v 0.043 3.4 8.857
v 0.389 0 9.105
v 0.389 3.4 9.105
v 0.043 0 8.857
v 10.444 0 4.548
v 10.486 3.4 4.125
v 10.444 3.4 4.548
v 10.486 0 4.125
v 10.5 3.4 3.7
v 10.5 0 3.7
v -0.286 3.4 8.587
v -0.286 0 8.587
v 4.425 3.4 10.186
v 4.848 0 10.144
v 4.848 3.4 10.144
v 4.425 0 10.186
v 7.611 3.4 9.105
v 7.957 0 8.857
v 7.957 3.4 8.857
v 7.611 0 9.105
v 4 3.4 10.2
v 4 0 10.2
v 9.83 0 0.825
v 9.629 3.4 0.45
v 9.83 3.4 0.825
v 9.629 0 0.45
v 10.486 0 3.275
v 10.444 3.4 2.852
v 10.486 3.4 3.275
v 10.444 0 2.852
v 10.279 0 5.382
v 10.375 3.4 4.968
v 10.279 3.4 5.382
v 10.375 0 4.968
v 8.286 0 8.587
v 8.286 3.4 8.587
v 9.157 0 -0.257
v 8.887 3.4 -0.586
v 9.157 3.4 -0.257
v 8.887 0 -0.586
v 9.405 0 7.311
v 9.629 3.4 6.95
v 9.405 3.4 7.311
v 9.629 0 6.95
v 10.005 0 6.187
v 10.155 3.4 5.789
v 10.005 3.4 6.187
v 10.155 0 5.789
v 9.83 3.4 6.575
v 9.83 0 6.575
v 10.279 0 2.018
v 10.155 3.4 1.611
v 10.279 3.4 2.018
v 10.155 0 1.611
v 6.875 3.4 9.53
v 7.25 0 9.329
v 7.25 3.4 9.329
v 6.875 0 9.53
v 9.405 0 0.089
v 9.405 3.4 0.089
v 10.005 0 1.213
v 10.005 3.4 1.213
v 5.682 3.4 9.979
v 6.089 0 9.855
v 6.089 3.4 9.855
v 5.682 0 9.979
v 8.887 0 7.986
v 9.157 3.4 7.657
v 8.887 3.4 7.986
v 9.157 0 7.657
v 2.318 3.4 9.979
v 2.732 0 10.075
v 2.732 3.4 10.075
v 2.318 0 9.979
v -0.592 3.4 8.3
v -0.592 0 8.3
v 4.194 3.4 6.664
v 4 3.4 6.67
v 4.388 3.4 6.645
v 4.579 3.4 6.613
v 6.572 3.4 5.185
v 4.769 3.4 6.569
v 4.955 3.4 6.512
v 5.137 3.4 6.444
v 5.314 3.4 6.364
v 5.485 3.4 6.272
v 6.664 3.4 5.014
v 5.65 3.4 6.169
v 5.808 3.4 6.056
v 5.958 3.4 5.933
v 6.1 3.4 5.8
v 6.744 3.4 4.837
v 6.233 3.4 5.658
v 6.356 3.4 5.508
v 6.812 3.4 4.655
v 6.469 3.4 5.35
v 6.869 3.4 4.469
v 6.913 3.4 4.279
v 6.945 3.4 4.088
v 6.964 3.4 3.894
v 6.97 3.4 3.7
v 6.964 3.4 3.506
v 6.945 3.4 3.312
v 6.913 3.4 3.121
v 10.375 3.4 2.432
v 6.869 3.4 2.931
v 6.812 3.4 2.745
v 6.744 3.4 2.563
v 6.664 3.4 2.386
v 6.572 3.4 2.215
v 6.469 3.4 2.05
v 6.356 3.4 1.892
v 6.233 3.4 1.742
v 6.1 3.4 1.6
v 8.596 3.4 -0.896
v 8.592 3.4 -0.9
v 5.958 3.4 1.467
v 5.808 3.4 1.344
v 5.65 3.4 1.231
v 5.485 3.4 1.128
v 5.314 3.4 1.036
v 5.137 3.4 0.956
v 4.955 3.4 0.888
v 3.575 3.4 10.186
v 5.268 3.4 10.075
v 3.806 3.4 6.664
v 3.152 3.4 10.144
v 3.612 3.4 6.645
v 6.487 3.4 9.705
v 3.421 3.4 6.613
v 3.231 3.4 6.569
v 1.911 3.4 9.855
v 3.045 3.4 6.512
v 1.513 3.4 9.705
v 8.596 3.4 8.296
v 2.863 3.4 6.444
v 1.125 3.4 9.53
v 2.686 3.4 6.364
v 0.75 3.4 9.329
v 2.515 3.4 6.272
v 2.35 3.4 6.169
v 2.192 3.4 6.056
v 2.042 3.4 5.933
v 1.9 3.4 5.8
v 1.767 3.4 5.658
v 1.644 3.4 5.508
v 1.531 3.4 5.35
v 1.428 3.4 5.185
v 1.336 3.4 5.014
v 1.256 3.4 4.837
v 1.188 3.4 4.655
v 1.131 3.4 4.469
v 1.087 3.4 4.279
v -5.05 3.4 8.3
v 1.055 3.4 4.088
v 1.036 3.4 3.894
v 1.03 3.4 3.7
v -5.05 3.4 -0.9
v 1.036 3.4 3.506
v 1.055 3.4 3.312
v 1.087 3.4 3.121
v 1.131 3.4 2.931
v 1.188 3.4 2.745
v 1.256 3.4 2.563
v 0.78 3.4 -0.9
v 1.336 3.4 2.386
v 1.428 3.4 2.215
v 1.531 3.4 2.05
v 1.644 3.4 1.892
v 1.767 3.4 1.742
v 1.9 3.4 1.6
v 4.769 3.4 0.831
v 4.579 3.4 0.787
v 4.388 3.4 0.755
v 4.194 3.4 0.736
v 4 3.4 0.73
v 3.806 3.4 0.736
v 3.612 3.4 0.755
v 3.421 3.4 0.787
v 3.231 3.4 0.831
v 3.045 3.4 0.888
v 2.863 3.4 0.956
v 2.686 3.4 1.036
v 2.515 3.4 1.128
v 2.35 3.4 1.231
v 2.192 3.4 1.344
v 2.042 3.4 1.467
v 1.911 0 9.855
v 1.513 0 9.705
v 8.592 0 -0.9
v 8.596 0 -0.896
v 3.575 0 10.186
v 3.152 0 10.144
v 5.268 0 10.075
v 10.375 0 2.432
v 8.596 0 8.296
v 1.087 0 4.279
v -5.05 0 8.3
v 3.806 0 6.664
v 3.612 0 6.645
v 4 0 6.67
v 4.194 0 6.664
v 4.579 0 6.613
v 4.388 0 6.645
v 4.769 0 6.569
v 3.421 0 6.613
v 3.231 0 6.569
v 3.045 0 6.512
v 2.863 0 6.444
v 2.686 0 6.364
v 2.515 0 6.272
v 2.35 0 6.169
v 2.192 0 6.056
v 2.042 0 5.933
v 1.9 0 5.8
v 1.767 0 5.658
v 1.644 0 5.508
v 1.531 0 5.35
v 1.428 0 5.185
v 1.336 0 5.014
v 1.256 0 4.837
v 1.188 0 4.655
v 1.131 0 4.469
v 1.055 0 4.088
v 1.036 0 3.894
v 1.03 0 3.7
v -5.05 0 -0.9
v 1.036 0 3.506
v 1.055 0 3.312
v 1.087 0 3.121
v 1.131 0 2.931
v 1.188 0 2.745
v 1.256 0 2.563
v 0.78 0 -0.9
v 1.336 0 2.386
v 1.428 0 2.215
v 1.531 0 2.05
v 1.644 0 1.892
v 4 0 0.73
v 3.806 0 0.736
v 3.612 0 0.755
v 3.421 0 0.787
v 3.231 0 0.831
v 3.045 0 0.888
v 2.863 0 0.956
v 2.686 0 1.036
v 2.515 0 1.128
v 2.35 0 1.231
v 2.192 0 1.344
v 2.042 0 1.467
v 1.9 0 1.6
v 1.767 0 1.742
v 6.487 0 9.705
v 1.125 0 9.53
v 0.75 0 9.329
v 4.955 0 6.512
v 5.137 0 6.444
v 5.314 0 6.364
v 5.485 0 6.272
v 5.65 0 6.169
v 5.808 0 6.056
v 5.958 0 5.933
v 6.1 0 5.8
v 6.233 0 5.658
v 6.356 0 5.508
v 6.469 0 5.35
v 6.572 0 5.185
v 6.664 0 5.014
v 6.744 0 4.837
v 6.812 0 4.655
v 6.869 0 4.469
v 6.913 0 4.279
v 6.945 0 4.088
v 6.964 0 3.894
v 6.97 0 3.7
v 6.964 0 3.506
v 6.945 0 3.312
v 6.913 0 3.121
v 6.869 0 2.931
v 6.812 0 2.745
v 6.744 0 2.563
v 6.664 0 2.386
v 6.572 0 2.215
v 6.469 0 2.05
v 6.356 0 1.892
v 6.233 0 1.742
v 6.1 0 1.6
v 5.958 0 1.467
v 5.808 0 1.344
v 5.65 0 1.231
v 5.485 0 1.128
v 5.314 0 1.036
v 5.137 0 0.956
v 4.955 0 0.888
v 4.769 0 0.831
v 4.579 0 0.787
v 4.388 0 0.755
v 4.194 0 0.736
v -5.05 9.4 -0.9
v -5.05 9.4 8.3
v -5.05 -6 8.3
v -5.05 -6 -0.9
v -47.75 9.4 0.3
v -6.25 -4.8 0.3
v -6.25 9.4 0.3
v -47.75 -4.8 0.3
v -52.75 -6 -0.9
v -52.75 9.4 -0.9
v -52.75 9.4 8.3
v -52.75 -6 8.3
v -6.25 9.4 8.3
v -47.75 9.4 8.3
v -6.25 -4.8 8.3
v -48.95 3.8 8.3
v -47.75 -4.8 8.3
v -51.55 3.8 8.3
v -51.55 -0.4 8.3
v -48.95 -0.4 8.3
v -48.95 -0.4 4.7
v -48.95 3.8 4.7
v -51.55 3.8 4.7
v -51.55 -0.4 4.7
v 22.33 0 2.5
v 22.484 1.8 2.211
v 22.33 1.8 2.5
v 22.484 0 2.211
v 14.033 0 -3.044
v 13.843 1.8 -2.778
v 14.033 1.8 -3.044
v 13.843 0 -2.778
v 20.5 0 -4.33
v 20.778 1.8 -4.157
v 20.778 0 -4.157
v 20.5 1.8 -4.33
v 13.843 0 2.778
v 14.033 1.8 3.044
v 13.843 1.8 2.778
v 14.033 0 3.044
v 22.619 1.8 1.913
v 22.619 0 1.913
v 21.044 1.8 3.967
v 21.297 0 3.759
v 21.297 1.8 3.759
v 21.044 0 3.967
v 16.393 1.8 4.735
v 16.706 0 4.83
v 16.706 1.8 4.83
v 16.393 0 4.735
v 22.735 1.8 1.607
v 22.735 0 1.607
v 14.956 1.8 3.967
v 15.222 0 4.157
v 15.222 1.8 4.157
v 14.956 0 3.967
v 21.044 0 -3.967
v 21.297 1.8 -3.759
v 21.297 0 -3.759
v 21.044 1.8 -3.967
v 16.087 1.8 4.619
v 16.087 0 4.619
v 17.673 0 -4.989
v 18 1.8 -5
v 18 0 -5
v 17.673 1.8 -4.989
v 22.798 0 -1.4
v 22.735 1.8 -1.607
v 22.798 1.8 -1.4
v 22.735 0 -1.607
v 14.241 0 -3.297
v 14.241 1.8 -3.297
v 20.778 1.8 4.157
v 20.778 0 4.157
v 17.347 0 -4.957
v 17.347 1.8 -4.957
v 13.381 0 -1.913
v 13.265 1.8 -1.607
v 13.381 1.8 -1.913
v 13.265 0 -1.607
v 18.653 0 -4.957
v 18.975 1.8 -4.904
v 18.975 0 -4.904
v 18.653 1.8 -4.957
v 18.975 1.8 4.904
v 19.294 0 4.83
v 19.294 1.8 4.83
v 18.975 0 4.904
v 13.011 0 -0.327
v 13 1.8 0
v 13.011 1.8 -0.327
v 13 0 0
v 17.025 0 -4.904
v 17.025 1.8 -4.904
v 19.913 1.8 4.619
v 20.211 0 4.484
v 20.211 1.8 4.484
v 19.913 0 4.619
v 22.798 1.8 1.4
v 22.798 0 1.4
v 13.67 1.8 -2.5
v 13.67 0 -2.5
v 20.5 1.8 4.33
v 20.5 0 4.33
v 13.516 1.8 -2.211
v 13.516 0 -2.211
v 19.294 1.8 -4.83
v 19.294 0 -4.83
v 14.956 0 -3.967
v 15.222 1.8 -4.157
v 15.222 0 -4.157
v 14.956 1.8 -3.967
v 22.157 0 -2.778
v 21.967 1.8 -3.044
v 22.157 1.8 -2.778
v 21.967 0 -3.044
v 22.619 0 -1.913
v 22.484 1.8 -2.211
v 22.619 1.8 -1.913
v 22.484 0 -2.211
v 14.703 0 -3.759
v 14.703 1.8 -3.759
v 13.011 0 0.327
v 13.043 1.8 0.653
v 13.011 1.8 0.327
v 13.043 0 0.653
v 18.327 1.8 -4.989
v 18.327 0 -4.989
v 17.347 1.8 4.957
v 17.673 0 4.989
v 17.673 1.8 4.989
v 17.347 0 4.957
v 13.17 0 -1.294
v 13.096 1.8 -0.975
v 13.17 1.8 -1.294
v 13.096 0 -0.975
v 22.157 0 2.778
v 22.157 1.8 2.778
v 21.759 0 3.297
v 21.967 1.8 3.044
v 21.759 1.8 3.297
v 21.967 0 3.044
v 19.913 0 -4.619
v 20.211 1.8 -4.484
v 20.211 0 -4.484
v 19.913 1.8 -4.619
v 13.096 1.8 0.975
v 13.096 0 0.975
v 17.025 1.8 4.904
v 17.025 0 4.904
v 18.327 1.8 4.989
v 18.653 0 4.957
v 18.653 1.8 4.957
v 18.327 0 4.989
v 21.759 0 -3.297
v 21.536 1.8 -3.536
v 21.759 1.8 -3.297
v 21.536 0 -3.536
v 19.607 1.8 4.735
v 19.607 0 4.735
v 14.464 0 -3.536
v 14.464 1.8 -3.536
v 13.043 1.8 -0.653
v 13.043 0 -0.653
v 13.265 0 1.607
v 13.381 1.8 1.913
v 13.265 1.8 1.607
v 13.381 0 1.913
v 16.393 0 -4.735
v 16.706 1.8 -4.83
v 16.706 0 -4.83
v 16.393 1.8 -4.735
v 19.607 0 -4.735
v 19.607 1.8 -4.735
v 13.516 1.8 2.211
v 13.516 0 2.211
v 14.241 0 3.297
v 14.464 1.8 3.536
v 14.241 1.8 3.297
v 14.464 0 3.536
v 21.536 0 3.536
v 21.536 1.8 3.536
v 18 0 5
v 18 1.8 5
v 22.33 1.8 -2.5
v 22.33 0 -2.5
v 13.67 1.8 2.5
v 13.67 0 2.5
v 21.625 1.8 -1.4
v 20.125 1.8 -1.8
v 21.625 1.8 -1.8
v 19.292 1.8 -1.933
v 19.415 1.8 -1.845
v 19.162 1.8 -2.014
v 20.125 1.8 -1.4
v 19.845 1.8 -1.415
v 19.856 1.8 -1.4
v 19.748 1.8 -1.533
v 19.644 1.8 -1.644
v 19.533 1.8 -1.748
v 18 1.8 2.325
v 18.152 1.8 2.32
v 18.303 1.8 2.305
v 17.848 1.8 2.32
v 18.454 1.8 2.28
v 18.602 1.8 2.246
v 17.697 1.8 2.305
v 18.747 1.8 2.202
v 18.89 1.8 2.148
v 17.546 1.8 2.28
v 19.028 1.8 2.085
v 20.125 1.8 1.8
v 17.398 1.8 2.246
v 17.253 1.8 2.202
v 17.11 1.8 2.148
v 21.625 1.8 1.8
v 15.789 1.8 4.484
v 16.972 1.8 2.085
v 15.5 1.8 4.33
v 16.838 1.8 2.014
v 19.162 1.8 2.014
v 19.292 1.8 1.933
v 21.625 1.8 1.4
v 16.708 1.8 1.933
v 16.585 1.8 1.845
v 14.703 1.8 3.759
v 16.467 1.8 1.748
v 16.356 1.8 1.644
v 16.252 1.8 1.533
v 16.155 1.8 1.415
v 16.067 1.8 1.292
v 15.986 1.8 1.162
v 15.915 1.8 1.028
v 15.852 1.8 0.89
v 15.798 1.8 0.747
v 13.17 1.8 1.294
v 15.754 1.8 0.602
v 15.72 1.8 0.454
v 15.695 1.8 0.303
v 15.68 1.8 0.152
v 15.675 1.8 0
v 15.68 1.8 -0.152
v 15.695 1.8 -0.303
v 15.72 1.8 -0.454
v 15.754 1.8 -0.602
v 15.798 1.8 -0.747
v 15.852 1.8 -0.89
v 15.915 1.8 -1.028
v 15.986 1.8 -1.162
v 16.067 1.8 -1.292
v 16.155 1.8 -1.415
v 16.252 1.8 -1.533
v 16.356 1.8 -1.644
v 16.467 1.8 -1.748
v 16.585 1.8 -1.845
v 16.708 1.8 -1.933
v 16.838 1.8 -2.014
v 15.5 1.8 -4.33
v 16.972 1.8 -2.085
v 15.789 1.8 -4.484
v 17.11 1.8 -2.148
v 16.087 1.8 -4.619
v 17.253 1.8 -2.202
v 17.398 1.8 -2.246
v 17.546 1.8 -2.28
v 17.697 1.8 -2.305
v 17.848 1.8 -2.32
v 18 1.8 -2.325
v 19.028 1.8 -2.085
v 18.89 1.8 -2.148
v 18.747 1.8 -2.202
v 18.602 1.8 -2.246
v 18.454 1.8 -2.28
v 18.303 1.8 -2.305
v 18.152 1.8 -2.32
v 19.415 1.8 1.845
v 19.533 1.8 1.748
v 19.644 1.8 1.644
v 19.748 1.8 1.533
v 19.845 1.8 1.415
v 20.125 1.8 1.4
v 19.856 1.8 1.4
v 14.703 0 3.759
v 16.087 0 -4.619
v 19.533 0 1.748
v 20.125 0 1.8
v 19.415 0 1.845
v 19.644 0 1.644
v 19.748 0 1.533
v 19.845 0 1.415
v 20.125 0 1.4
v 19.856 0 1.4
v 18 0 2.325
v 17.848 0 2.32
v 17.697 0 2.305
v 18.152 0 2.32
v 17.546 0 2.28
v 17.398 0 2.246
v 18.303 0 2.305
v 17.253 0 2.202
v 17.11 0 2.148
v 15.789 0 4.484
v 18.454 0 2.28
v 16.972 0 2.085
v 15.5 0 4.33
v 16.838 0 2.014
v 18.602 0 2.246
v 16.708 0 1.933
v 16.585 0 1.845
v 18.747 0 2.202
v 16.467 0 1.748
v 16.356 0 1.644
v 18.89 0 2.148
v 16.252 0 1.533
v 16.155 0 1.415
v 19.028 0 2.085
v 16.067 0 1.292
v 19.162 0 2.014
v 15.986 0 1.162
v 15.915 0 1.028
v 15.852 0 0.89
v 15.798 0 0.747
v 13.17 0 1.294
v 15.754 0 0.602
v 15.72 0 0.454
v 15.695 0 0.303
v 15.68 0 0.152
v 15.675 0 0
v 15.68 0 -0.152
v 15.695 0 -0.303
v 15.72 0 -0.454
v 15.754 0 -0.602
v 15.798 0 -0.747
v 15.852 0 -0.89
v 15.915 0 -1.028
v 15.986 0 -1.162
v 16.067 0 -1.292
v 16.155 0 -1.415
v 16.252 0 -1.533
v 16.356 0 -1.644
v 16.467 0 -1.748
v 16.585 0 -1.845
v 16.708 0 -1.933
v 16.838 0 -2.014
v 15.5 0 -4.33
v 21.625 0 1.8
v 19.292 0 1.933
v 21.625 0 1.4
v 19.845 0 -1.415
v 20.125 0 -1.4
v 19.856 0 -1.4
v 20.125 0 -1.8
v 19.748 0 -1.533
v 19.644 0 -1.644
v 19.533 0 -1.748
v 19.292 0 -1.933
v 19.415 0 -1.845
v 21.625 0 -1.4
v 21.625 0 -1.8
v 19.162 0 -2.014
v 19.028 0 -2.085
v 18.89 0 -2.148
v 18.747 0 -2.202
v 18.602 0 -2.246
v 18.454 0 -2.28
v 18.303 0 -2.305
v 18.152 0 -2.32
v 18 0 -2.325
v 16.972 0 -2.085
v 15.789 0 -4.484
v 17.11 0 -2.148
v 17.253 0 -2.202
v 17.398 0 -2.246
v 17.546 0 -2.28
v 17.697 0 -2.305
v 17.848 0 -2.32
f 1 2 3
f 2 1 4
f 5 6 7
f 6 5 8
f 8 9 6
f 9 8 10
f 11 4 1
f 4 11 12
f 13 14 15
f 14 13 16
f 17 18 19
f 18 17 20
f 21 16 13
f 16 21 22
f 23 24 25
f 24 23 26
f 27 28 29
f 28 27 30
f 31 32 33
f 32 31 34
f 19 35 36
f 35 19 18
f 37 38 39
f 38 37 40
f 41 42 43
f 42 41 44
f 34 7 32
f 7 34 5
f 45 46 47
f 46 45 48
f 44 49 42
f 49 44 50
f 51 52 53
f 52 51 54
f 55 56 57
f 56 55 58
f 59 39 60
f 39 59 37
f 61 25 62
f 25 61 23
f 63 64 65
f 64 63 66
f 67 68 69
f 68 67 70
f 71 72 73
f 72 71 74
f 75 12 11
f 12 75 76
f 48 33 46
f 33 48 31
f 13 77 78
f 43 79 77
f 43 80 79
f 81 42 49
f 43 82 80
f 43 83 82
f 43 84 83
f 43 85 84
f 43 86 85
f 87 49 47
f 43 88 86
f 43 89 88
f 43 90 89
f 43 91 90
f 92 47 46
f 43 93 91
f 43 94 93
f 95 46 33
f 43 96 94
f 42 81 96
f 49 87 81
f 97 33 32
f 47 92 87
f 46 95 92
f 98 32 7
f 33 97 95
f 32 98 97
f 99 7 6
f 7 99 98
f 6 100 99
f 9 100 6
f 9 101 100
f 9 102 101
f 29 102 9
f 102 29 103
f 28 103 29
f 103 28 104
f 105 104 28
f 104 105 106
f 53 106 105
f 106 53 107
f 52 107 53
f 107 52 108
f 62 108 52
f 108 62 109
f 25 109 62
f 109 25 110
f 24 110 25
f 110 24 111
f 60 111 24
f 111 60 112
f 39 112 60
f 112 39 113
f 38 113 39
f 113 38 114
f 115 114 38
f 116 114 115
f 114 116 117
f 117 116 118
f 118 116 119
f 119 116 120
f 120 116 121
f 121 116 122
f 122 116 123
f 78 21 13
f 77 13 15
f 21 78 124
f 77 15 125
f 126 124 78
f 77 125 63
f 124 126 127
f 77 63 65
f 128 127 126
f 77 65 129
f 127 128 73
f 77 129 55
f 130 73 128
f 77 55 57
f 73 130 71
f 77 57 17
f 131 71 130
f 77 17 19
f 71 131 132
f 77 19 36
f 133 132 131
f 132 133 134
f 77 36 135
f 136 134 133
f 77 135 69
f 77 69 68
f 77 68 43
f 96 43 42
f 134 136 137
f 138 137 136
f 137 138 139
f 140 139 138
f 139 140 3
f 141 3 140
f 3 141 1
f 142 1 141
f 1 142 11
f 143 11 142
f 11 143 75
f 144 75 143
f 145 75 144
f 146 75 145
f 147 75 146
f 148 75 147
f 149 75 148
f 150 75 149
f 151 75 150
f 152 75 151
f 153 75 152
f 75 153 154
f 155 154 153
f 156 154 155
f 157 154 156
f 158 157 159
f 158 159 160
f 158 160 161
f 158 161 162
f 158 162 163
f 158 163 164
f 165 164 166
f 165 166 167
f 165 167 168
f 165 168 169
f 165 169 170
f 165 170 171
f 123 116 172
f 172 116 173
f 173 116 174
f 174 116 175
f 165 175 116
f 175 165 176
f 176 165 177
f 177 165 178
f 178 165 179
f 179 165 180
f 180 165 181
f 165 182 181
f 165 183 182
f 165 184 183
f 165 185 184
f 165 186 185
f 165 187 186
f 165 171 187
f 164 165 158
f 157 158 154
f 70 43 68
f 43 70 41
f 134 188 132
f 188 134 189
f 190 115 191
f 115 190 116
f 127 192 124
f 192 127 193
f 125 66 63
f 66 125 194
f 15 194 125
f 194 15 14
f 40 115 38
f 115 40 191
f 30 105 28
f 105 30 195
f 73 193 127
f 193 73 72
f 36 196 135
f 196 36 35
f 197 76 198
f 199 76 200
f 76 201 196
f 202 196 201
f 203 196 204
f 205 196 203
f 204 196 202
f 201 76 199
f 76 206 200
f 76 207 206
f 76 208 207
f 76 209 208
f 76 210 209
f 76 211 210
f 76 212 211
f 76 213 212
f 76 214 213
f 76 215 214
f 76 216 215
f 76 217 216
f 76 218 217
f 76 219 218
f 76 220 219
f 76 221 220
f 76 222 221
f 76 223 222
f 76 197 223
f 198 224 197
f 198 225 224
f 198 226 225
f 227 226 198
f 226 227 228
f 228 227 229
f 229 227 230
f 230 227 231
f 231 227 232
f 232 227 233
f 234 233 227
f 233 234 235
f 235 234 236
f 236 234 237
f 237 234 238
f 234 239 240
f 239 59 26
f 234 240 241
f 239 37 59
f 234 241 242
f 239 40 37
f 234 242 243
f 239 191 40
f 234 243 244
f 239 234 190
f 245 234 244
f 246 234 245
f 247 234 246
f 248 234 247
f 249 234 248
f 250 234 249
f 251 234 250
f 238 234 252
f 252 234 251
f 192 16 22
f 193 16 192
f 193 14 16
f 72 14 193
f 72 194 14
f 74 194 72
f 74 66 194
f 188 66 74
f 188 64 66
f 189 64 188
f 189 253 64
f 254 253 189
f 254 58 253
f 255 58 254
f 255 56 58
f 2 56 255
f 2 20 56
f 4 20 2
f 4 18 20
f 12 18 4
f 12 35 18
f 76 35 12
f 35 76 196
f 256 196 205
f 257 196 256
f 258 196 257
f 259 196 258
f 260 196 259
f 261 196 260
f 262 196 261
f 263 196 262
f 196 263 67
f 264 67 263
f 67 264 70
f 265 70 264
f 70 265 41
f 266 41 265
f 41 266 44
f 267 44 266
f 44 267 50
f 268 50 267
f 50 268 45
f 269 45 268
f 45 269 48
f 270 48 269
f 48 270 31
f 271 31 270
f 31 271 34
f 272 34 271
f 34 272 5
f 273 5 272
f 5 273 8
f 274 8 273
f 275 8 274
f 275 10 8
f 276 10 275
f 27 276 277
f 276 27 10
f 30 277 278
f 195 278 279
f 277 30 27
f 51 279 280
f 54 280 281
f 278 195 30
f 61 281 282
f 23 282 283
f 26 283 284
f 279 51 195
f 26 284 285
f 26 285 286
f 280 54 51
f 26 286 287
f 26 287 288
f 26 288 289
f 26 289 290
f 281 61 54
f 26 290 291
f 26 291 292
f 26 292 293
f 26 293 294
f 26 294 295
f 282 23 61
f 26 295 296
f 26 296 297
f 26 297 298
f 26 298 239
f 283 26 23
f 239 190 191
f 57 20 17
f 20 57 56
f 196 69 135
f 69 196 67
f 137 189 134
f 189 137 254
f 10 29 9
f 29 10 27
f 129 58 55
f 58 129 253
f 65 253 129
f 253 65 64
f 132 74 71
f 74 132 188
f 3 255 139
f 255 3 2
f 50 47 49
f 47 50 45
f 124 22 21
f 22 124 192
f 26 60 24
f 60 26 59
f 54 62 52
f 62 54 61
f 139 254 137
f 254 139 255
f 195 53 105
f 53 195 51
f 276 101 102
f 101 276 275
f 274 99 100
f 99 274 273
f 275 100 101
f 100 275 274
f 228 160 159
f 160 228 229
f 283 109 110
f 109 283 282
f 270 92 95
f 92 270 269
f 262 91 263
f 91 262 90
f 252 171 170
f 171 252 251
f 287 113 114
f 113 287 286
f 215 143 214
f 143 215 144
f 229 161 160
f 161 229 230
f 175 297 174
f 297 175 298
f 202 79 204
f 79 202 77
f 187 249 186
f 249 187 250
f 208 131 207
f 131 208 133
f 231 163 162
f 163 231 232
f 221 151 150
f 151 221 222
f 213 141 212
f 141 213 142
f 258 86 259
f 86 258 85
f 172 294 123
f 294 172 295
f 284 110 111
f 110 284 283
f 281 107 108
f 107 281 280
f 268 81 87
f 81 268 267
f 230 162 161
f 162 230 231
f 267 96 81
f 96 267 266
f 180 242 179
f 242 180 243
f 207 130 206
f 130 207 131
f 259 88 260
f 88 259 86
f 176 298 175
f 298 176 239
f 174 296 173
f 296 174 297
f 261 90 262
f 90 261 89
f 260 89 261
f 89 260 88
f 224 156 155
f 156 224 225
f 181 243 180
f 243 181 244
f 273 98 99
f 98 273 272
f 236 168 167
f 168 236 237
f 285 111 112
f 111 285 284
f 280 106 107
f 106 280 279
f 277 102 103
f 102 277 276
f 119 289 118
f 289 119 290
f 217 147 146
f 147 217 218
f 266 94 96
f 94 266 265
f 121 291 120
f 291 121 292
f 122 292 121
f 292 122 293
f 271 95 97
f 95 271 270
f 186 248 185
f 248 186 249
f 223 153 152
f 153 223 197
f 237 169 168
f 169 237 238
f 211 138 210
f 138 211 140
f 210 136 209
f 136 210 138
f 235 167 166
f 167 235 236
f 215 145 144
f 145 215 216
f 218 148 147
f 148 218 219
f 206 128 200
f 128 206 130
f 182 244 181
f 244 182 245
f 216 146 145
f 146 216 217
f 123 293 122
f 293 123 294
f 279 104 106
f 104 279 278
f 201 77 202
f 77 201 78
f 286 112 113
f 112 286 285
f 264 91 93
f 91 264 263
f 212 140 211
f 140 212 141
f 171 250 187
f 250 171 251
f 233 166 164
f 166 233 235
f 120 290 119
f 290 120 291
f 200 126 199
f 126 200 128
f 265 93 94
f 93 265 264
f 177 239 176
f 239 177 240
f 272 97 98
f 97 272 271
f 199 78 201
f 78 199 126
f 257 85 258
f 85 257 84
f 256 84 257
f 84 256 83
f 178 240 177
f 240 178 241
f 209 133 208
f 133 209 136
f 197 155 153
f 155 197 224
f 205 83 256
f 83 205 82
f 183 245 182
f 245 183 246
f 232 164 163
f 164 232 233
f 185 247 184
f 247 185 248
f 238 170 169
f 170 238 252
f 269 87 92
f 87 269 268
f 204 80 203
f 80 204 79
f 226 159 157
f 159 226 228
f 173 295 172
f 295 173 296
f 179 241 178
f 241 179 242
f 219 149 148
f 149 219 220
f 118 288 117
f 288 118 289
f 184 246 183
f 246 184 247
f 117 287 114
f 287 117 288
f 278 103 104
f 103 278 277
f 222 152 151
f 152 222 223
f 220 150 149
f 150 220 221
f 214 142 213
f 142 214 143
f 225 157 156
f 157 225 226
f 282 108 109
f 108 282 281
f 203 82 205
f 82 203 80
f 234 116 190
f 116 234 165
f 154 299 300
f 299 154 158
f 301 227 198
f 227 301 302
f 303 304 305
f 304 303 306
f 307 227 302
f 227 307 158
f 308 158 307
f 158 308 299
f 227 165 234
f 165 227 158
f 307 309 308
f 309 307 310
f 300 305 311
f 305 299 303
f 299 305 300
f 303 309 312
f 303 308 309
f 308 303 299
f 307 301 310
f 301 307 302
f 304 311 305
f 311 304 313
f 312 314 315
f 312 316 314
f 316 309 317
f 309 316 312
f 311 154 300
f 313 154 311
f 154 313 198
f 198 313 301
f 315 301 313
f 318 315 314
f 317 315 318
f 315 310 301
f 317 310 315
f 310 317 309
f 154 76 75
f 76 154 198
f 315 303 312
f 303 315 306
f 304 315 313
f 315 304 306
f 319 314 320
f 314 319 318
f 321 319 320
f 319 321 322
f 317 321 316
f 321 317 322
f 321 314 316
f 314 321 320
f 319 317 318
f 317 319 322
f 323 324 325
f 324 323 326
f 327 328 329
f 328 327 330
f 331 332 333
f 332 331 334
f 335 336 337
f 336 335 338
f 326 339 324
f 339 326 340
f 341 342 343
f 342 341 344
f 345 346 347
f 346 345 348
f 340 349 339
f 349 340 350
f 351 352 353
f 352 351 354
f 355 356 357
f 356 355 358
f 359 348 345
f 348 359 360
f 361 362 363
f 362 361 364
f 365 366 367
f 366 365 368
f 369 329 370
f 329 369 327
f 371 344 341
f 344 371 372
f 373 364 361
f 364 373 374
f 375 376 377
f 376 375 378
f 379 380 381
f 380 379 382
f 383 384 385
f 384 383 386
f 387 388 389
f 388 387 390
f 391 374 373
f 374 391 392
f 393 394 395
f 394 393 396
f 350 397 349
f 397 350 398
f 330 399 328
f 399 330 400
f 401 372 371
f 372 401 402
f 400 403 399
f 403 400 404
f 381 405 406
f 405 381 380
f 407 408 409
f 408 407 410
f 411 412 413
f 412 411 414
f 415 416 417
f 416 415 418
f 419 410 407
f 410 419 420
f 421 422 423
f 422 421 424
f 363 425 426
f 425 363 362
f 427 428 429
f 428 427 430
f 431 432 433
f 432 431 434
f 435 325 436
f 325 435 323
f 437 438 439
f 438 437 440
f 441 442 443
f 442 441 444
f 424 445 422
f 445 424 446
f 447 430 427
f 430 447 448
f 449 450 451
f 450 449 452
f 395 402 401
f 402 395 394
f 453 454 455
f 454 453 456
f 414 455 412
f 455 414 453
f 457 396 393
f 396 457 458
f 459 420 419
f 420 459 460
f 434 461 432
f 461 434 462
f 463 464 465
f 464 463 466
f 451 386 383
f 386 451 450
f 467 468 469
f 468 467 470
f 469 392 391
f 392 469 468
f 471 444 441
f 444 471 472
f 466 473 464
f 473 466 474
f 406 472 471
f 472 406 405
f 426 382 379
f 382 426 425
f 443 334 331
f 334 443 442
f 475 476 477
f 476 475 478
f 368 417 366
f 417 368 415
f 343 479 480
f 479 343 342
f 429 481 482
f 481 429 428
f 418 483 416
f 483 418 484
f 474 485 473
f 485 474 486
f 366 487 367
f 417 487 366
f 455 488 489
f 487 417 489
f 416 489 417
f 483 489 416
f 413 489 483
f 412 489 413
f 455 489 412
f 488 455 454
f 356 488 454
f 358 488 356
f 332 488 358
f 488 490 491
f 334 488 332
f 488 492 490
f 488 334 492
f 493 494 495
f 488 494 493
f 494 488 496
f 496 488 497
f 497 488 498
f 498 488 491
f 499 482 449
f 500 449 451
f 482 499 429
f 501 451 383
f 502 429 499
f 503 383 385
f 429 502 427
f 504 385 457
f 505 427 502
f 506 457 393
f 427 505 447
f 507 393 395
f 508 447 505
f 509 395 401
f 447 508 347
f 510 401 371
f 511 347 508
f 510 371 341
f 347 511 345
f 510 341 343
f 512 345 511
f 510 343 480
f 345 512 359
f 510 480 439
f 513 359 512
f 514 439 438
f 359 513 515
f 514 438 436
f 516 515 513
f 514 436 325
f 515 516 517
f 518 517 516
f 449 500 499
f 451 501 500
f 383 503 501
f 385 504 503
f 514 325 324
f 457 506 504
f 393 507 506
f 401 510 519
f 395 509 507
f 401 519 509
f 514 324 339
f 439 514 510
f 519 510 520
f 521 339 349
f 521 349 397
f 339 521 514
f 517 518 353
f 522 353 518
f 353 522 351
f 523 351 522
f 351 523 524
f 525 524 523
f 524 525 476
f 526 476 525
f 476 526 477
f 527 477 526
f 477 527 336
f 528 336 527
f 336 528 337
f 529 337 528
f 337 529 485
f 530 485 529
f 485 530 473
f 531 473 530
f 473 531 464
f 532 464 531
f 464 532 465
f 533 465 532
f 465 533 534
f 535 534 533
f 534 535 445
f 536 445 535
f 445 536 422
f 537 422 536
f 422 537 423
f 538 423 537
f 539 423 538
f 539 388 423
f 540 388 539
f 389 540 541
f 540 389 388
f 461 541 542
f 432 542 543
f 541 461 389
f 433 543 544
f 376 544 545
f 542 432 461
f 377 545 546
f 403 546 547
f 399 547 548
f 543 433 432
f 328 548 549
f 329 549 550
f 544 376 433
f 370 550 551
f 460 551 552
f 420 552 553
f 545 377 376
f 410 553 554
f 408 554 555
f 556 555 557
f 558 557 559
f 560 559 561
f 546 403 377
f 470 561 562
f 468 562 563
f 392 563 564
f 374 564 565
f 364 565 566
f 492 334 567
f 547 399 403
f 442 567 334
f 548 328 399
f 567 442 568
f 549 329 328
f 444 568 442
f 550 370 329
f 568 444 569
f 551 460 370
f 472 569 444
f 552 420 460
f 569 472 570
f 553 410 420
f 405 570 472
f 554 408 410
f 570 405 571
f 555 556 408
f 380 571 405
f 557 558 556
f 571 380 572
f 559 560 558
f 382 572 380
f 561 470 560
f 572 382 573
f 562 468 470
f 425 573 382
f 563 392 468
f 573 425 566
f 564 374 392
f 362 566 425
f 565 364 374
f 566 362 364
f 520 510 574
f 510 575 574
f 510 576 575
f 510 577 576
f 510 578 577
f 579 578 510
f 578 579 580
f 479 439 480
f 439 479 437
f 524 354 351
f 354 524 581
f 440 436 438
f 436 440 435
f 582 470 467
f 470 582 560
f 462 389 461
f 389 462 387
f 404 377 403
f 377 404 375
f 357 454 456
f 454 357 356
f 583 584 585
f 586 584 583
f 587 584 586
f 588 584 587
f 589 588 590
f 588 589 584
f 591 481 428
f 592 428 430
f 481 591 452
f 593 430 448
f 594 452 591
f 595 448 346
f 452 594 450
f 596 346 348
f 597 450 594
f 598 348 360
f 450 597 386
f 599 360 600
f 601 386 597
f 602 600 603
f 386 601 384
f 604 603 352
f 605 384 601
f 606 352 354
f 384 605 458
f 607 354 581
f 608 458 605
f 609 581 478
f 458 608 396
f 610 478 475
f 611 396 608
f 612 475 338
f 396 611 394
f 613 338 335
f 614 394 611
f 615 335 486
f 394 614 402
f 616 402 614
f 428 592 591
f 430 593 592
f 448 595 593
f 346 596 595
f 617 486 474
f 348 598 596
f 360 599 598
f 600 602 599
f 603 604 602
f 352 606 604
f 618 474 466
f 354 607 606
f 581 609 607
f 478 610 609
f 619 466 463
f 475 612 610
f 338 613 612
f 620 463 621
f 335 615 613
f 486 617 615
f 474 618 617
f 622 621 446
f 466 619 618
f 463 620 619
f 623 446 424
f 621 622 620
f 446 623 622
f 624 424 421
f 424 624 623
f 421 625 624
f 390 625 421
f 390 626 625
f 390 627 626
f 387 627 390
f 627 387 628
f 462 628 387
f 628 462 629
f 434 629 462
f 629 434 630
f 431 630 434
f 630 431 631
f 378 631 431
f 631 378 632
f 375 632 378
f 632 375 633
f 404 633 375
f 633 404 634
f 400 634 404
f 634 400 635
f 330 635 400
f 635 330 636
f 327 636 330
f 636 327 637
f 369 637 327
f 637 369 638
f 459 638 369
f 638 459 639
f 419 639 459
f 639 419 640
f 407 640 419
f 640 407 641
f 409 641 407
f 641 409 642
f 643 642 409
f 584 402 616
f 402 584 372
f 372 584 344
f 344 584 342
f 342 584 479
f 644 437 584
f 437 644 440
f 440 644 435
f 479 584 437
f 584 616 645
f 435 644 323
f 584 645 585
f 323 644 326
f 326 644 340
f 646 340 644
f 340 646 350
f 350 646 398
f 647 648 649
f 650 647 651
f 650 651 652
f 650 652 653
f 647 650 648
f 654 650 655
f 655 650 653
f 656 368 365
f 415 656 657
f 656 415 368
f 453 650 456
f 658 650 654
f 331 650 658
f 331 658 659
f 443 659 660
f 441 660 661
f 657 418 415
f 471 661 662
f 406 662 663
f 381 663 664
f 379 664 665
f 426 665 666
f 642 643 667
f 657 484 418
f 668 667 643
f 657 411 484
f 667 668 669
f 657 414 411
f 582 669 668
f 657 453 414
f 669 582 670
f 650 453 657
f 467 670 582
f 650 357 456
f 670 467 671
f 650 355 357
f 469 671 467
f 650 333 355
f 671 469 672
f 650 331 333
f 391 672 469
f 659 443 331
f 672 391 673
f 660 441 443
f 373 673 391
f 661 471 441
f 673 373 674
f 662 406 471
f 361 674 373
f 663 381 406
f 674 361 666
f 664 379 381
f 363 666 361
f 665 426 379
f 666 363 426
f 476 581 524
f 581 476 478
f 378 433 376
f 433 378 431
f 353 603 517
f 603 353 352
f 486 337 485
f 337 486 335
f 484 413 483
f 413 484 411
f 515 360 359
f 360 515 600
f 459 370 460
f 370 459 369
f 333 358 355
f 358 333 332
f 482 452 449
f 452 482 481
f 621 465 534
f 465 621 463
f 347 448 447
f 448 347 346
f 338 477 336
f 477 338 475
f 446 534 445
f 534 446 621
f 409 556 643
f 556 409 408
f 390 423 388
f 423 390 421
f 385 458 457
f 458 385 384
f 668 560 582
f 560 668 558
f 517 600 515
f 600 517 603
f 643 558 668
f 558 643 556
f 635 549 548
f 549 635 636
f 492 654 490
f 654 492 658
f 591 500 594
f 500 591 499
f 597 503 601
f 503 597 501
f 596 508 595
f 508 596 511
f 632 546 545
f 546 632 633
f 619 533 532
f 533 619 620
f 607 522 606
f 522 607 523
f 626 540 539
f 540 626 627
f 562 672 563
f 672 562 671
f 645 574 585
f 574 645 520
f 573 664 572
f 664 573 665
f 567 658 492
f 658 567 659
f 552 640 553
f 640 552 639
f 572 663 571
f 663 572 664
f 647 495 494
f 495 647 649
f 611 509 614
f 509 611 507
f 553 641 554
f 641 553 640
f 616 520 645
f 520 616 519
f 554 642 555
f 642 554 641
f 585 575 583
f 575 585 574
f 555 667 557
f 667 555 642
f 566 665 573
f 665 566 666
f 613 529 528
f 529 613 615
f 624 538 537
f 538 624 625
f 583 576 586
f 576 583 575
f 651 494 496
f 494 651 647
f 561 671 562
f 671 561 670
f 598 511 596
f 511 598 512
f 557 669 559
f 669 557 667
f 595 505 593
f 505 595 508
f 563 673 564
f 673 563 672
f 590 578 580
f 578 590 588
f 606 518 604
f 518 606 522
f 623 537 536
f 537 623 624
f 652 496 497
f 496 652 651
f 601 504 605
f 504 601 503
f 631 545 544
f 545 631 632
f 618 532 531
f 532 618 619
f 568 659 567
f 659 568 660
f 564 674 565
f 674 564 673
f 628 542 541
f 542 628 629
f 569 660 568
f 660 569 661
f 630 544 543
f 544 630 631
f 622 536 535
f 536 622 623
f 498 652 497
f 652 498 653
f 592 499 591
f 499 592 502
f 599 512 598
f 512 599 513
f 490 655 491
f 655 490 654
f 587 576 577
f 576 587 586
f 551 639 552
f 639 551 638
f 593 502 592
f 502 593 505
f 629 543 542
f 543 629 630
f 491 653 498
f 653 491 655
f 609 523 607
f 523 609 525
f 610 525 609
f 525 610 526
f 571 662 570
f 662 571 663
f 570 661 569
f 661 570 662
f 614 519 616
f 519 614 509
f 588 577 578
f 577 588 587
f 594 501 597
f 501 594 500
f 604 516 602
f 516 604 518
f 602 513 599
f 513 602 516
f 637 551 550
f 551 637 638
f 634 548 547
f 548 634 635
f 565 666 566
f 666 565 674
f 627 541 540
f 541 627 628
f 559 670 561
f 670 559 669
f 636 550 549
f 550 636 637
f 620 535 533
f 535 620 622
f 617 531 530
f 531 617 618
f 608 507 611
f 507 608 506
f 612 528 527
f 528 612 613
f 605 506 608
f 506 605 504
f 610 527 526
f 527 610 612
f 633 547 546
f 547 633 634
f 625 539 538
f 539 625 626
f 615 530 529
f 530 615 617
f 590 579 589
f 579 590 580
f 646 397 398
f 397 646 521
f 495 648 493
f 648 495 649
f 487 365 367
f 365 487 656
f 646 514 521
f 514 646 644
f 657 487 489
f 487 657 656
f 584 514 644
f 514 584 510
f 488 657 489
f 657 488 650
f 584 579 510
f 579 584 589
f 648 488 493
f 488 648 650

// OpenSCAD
// DOUBLE TAKE FRAMES DESIGN RELEASE
// DTF_RELEASE: 2.0.2
// Released: 2026-09-04
// Versioning: Semantic Versioning 2.0.0 (https://semver.org/)
// Status: CANONICAL
// Changes in 2.0.2:
// - Carried forward unchanged for the native 3MF packaging hotfix.
// Changes in 2.0.1:
// - Carried forward unchanged for the prepared-project packaging correction.
// Changes in 2.0.0:
// - Carried forward without geometry changes for the coordinated 2.0.0 release.
// Full release notes: https://doubletakeframes.com/build/#design-release
//
$fn = 96;

eps = 0.05;

// 0 = separated printable latch and keeper
// 1 = FN-weight latch only
// 2 = C-shaped keeper only
render_part = 0;

// =========================================================
// FN WEIGHT LATCH
// =========================================================
post_d = 5.5;
clear_radial = 0.22;
eye_inner_d = post_d + 2 * clear_radial;
eye_outer_d = 13.0;

latch_t = 3.4;
pivot_x = 4.0;

corral_clear_w_x = 41.5;
corral_clear_d_y = 13.0;
corral_wall_t = 1.2;
corral_depth_z = 8.0;
corral_floor_t = 1.2;
corral_end_wall_t_x = 5.0;
canonical_weight_center_x = -27.0;

// Match the installed latch plane used by the canonical dry-wall rig.
standoff_h = 0.8;
post_h = 4.0;
corral_global_outer_y1 = -0.30;
corral_center_y_target = corral_global_outer_y1
                         - (corral_clear_d_y + 2 * corral_wall_t) / 2;
pad_t = -corral_center_y_target - standoff_h - post_h / 2;
post_y1 = -pad_t - standoff_h - post_h;
latch_install_y = post_y1 + (post_h - latch_t) / 2;

corral_inner_x0 = canonical_weight_center_x - corral_clear_w_x / 2;
corral_inner_x1 = canonical_weight_center_x + corral_clear_w_x / 2;
corral_floor_x0 = corral_inner_x0 - corral_end_wall_t_x;
corral_floor_x1 = corral_inner_x1 + corral_wall_t;

corral_outer_y1 = corral_global_outer_y1 - latch_install_y;
corral_inner_y1 = corral_outer_y1 - corral_wall_t;
corral_inner_y0 = corral_inner_y1 - corral_clear_d_y;
corral_outer_y0 = corral_inner_y0 - corral_wall_t;

corral_floor_z0 = -0.90;
corral_floor_z = corral_floor_z0 + corral_floor_t;
corral_wall_z1 = corral_floor_z + corral_depth_z;
pivot_z = (corral_floor_z0 + corral_wall_z1) / 2;
pivot_eye_flat_local_z = corral_floor_z0 - pivot_z;

pivot_transition_x0 = corral_floor_x1;
pivot_transition_x1 = pivot_x - (eye_inner_d / 2 + 0.25);

// Far-end Y-retention socket. The matching roof-hung tooth belongs to the
// fixed dry-wall rig; this socket is open at the top so the latch disengages
// cleanly as it swings downward.
latch_key_tooth_w_x = 1.4;
latch_key_tooth_w_y = 3.0;
latch_key_clear_xy = 0.60;
latch_key_clear_z = 0.60;
latch_key_engagement_z = 3.0;

latch_key_xc = (corral_floor_x0 + corral_inner_x0) / 2;
latch_key_local_yc = (corral_outer_y0 + corral_outer_y1) / 2;
latch_key_notch_x0 = latch_key_xc - latch_key_tooth_w_x / 2
                     - latch_key_clear_xy;
latch_key_notch_x1 = latch_key_xc + latch_key_tooth_w_x / 2
                     + latch_key_clear_xy;
latch_key_notch_y0 = latch_key_local_yc - latch_key_tooth_w_y / 2
                     - latch_key_clear_xy;
latch_key_notch_y1 = latch_key_local_yc + latch_key_tooth_w_y / 2
                     + latch_key_clear_xy;
latch_key_notch_z0 = corral_wall_z1 - latch_key_engagement_z
                     - latch_key_clear_z;

// =========================================================
// C-SHAPED KEEPER
// =========================================================
clip_outer_d = 10.0;
clip_t = 1.8;
grip_hole_d = 4.65;
gap_w = 2.8;
flat_depth = 1.5;

// =========================================================
// HELPERS
// =========================================================
module rect_prism(x0, x1, y0, y1, z0, z1) {
    translate([min(x0, x1), min(y0, y1), min(z0, z1)])
        cube([abs(x1 - x0), abs(y1 - y0), abs(z1 - z0)]);
}

module cyl_y_span(d, y0, y1) {
    translate([0, max(y0, y1), 0])
        rotate([90, 0, 0])
            cylinder(d=d, h=abs(y1 - y0), center=false);
}

// =========================================================
// PRINTABLE PARTS
// =========================================================
module canonical_latch_core() {
    translate([pivot_x, 0, pivot_z])
        difference() {
            cyl_y_span(eye_outer_d, 0, latch_t);
            cyl_y_span(eye_inner_d, -0.1, latch_t + 0.2);

            // Flatten only the unused lower eye arc so the complete latch
            // prints on the same plane as the corral floor.
            rect_prism(-eye_outer_d / 2 - 1,
                       eye_outer_d / 2 + 1,
                       -0.1, latch_t + 0.2,
                       -eye_outer_d / 2 - 1,
                       pivot_eye_flat_local_z);
        }
}

module fn_weight_corral() {
    difference() {
        union() {
            // Shallow floor beneath the weight pocket and keyed extension.
            rect_prism(corral_floor_x0, corral_floor_x1,
                       corral_outer_y0, corral_outer_y1,
                       corral_floor_z0, corral_floor_z);

            // Viewer-facing wall. The frame wall closes the opposite side.
            rect_prism(corral_inner_x0, corral_inner_x1,
                       corral_outer_y0, corral_inner_y0,
                       corral_floor_z, corral_wall_z1);

            // Pivot-side wall.
            rect_prism(corral_inner_x1, corral_floor_x1,
                       corral_outer_y0, corral_outer_y1,
                       corral_floor_z, corral_wall_z1);

            // Substantial far-end wall carrying the retention socket.
            rect_prism(corral_floor_x0, corral_inner_x0,
                       corral_outer_y0, corral_outer_y1,
                       corral_floor_z, corral_wall_z1);

            // Compact load path from the corral into the pivot eye.
            rect_prism(pivot_transition_x0, pivot_transition_x1,
                       0, latch_t,
                       corral_floor_z0, corral_wall_z1);
        }

        rect_prism(latch_key_notch_x0, latch_key_notch_x1,
                   latch_key_notch_y0, latch_key_notch_y1,
                   latch_key_notch_z0, corral_wall_z1 + eps);
    }
}

module swinging_latch() {
    union() {
        canonical_latch_core();
        fn_weight_corral();
    }
}

module c_keeper() {
    difference() {
        cyl_y_span(clip_outer_d, 0, clip_t);
        cyl_y_span(grip_hole_d, -0.1, clip_t + 0.2);

        rect_prism(0, clip_outer_d / 2 + 0.5,
                   -0.1, clip_t + 0.1,
                   -gap_w / 2, gap_w / 2);

        rect_prism(grip_hole_d / 2 - 0.2,
                   grip_hole_d / 2 - 0.2 + flat_depth,
                   -0.1, clip_t + 0.1,
                   -gap_w / 2 - 0.4, gap_w / 2 + 0.4);
    }
}

assert(corral_clear_w_x == 41.5);
assert(corral_clear_d_y == 13.0);
assert(pivot_transition_x1 > pivot_transition_x0);

if (render_part == 1)
    swinging_latch();
else if (render_part == 2)
    c_keeper();
else {
    swinging_latch();
    translate([18, 0, 0]) c_keeper();
}
